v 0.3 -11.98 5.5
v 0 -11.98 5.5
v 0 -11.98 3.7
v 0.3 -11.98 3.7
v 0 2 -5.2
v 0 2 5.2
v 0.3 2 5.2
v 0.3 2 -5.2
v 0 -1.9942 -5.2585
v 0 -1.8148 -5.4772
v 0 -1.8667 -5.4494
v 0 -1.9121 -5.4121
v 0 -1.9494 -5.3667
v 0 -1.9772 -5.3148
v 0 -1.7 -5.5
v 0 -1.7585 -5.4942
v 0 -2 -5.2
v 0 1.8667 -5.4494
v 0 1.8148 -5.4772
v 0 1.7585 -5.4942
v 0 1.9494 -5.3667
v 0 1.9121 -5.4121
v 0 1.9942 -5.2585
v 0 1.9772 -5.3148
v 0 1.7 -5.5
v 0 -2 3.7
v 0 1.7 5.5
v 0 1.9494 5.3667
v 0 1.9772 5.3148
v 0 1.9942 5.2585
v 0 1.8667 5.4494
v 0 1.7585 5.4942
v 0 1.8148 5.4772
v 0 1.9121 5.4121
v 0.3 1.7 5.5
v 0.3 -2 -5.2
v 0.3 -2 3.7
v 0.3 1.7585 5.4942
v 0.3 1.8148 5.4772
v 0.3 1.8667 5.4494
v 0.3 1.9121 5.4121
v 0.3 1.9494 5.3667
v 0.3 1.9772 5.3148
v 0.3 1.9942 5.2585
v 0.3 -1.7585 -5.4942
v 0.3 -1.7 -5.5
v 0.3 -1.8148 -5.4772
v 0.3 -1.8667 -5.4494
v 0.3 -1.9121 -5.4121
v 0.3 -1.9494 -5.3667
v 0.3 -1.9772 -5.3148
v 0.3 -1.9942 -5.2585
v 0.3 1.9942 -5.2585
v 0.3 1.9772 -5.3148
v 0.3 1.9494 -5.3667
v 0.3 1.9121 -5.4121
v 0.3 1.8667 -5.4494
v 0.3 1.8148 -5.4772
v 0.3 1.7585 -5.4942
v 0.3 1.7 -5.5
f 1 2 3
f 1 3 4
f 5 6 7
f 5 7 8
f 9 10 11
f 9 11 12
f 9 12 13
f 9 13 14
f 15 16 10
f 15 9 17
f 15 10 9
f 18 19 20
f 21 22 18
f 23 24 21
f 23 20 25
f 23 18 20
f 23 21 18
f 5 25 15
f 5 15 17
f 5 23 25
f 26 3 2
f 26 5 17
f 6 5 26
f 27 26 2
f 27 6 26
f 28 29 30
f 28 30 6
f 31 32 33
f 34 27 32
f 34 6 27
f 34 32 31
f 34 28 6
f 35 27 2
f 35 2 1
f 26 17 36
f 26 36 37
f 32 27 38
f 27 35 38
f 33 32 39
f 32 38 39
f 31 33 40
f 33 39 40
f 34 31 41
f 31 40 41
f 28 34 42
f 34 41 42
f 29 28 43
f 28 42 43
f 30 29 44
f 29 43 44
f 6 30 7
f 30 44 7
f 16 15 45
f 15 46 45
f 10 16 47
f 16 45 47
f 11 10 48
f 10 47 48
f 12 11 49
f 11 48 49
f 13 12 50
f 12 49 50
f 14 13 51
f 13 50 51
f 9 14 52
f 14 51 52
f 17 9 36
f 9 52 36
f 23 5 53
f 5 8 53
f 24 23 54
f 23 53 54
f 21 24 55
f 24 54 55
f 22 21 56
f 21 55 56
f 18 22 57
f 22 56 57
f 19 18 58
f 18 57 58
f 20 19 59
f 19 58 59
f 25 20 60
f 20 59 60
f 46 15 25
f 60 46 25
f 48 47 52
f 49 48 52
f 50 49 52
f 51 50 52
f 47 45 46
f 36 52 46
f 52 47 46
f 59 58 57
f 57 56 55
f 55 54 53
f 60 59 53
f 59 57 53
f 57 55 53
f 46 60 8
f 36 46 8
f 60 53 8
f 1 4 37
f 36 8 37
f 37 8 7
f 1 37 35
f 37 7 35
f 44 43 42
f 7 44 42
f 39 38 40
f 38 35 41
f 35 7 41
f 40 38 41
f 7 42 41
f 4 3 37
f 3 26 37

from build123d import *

# Parameters (mm, degrees)
EXTRUDE_1_DEPTH = 0.3
FILLET_1_R      = 0.3
SKETCH_4_W      = 0.3
SKETCH_4_H      = 1.8
EXTRUDE_3_DEPTH = 3


with BuildPart() as part:
    # 草图1 → 凸台-拉伸1 (new body)
    with BuildSketch(Plane(origin=(0, 0, 0), x_dir=(0, 0, -1), z_dir=(1, 0, 0))):
        Polygon((-5.5, -2), (-5.5, -1.5), (-5.5, -0.5), (-5.5, 0.5), (-5.5, 1.5), (-5.5, 2), (5.5, 2), (5.5, 1.5), (5.5, 0.5), (5.5, -0.5), (5.5, -1.5), (5.5, -2), (-3.7, -2), (-3.7, -8.98), (-5.5, -8.98), align=None)
    extrude(amount=EXTRUDE_1_DEPTH)

    # 圆角1
    fillet_1_edges = [part.edges().sort_by_distance(p)[0] for p in [
        (0.15, -2, -5.5),
        (0.15, 2, 5.5),
        (0.15, 2, -5.5),
    ]]
    fillet(fillet_1_edges, radius=FILLET_1_R)

    # 草图4 → 凸台-拉伸3 (add)
    with BuildSketch(Plane.XZ.offset(8.98)):
        with Locations((0.15, 4.6)):
            Rectangle(SKETCH_4_W, SKETCH_4_H)
    extrude(amount=EXTRUDE_3_DEPTH)


solid = part.part
